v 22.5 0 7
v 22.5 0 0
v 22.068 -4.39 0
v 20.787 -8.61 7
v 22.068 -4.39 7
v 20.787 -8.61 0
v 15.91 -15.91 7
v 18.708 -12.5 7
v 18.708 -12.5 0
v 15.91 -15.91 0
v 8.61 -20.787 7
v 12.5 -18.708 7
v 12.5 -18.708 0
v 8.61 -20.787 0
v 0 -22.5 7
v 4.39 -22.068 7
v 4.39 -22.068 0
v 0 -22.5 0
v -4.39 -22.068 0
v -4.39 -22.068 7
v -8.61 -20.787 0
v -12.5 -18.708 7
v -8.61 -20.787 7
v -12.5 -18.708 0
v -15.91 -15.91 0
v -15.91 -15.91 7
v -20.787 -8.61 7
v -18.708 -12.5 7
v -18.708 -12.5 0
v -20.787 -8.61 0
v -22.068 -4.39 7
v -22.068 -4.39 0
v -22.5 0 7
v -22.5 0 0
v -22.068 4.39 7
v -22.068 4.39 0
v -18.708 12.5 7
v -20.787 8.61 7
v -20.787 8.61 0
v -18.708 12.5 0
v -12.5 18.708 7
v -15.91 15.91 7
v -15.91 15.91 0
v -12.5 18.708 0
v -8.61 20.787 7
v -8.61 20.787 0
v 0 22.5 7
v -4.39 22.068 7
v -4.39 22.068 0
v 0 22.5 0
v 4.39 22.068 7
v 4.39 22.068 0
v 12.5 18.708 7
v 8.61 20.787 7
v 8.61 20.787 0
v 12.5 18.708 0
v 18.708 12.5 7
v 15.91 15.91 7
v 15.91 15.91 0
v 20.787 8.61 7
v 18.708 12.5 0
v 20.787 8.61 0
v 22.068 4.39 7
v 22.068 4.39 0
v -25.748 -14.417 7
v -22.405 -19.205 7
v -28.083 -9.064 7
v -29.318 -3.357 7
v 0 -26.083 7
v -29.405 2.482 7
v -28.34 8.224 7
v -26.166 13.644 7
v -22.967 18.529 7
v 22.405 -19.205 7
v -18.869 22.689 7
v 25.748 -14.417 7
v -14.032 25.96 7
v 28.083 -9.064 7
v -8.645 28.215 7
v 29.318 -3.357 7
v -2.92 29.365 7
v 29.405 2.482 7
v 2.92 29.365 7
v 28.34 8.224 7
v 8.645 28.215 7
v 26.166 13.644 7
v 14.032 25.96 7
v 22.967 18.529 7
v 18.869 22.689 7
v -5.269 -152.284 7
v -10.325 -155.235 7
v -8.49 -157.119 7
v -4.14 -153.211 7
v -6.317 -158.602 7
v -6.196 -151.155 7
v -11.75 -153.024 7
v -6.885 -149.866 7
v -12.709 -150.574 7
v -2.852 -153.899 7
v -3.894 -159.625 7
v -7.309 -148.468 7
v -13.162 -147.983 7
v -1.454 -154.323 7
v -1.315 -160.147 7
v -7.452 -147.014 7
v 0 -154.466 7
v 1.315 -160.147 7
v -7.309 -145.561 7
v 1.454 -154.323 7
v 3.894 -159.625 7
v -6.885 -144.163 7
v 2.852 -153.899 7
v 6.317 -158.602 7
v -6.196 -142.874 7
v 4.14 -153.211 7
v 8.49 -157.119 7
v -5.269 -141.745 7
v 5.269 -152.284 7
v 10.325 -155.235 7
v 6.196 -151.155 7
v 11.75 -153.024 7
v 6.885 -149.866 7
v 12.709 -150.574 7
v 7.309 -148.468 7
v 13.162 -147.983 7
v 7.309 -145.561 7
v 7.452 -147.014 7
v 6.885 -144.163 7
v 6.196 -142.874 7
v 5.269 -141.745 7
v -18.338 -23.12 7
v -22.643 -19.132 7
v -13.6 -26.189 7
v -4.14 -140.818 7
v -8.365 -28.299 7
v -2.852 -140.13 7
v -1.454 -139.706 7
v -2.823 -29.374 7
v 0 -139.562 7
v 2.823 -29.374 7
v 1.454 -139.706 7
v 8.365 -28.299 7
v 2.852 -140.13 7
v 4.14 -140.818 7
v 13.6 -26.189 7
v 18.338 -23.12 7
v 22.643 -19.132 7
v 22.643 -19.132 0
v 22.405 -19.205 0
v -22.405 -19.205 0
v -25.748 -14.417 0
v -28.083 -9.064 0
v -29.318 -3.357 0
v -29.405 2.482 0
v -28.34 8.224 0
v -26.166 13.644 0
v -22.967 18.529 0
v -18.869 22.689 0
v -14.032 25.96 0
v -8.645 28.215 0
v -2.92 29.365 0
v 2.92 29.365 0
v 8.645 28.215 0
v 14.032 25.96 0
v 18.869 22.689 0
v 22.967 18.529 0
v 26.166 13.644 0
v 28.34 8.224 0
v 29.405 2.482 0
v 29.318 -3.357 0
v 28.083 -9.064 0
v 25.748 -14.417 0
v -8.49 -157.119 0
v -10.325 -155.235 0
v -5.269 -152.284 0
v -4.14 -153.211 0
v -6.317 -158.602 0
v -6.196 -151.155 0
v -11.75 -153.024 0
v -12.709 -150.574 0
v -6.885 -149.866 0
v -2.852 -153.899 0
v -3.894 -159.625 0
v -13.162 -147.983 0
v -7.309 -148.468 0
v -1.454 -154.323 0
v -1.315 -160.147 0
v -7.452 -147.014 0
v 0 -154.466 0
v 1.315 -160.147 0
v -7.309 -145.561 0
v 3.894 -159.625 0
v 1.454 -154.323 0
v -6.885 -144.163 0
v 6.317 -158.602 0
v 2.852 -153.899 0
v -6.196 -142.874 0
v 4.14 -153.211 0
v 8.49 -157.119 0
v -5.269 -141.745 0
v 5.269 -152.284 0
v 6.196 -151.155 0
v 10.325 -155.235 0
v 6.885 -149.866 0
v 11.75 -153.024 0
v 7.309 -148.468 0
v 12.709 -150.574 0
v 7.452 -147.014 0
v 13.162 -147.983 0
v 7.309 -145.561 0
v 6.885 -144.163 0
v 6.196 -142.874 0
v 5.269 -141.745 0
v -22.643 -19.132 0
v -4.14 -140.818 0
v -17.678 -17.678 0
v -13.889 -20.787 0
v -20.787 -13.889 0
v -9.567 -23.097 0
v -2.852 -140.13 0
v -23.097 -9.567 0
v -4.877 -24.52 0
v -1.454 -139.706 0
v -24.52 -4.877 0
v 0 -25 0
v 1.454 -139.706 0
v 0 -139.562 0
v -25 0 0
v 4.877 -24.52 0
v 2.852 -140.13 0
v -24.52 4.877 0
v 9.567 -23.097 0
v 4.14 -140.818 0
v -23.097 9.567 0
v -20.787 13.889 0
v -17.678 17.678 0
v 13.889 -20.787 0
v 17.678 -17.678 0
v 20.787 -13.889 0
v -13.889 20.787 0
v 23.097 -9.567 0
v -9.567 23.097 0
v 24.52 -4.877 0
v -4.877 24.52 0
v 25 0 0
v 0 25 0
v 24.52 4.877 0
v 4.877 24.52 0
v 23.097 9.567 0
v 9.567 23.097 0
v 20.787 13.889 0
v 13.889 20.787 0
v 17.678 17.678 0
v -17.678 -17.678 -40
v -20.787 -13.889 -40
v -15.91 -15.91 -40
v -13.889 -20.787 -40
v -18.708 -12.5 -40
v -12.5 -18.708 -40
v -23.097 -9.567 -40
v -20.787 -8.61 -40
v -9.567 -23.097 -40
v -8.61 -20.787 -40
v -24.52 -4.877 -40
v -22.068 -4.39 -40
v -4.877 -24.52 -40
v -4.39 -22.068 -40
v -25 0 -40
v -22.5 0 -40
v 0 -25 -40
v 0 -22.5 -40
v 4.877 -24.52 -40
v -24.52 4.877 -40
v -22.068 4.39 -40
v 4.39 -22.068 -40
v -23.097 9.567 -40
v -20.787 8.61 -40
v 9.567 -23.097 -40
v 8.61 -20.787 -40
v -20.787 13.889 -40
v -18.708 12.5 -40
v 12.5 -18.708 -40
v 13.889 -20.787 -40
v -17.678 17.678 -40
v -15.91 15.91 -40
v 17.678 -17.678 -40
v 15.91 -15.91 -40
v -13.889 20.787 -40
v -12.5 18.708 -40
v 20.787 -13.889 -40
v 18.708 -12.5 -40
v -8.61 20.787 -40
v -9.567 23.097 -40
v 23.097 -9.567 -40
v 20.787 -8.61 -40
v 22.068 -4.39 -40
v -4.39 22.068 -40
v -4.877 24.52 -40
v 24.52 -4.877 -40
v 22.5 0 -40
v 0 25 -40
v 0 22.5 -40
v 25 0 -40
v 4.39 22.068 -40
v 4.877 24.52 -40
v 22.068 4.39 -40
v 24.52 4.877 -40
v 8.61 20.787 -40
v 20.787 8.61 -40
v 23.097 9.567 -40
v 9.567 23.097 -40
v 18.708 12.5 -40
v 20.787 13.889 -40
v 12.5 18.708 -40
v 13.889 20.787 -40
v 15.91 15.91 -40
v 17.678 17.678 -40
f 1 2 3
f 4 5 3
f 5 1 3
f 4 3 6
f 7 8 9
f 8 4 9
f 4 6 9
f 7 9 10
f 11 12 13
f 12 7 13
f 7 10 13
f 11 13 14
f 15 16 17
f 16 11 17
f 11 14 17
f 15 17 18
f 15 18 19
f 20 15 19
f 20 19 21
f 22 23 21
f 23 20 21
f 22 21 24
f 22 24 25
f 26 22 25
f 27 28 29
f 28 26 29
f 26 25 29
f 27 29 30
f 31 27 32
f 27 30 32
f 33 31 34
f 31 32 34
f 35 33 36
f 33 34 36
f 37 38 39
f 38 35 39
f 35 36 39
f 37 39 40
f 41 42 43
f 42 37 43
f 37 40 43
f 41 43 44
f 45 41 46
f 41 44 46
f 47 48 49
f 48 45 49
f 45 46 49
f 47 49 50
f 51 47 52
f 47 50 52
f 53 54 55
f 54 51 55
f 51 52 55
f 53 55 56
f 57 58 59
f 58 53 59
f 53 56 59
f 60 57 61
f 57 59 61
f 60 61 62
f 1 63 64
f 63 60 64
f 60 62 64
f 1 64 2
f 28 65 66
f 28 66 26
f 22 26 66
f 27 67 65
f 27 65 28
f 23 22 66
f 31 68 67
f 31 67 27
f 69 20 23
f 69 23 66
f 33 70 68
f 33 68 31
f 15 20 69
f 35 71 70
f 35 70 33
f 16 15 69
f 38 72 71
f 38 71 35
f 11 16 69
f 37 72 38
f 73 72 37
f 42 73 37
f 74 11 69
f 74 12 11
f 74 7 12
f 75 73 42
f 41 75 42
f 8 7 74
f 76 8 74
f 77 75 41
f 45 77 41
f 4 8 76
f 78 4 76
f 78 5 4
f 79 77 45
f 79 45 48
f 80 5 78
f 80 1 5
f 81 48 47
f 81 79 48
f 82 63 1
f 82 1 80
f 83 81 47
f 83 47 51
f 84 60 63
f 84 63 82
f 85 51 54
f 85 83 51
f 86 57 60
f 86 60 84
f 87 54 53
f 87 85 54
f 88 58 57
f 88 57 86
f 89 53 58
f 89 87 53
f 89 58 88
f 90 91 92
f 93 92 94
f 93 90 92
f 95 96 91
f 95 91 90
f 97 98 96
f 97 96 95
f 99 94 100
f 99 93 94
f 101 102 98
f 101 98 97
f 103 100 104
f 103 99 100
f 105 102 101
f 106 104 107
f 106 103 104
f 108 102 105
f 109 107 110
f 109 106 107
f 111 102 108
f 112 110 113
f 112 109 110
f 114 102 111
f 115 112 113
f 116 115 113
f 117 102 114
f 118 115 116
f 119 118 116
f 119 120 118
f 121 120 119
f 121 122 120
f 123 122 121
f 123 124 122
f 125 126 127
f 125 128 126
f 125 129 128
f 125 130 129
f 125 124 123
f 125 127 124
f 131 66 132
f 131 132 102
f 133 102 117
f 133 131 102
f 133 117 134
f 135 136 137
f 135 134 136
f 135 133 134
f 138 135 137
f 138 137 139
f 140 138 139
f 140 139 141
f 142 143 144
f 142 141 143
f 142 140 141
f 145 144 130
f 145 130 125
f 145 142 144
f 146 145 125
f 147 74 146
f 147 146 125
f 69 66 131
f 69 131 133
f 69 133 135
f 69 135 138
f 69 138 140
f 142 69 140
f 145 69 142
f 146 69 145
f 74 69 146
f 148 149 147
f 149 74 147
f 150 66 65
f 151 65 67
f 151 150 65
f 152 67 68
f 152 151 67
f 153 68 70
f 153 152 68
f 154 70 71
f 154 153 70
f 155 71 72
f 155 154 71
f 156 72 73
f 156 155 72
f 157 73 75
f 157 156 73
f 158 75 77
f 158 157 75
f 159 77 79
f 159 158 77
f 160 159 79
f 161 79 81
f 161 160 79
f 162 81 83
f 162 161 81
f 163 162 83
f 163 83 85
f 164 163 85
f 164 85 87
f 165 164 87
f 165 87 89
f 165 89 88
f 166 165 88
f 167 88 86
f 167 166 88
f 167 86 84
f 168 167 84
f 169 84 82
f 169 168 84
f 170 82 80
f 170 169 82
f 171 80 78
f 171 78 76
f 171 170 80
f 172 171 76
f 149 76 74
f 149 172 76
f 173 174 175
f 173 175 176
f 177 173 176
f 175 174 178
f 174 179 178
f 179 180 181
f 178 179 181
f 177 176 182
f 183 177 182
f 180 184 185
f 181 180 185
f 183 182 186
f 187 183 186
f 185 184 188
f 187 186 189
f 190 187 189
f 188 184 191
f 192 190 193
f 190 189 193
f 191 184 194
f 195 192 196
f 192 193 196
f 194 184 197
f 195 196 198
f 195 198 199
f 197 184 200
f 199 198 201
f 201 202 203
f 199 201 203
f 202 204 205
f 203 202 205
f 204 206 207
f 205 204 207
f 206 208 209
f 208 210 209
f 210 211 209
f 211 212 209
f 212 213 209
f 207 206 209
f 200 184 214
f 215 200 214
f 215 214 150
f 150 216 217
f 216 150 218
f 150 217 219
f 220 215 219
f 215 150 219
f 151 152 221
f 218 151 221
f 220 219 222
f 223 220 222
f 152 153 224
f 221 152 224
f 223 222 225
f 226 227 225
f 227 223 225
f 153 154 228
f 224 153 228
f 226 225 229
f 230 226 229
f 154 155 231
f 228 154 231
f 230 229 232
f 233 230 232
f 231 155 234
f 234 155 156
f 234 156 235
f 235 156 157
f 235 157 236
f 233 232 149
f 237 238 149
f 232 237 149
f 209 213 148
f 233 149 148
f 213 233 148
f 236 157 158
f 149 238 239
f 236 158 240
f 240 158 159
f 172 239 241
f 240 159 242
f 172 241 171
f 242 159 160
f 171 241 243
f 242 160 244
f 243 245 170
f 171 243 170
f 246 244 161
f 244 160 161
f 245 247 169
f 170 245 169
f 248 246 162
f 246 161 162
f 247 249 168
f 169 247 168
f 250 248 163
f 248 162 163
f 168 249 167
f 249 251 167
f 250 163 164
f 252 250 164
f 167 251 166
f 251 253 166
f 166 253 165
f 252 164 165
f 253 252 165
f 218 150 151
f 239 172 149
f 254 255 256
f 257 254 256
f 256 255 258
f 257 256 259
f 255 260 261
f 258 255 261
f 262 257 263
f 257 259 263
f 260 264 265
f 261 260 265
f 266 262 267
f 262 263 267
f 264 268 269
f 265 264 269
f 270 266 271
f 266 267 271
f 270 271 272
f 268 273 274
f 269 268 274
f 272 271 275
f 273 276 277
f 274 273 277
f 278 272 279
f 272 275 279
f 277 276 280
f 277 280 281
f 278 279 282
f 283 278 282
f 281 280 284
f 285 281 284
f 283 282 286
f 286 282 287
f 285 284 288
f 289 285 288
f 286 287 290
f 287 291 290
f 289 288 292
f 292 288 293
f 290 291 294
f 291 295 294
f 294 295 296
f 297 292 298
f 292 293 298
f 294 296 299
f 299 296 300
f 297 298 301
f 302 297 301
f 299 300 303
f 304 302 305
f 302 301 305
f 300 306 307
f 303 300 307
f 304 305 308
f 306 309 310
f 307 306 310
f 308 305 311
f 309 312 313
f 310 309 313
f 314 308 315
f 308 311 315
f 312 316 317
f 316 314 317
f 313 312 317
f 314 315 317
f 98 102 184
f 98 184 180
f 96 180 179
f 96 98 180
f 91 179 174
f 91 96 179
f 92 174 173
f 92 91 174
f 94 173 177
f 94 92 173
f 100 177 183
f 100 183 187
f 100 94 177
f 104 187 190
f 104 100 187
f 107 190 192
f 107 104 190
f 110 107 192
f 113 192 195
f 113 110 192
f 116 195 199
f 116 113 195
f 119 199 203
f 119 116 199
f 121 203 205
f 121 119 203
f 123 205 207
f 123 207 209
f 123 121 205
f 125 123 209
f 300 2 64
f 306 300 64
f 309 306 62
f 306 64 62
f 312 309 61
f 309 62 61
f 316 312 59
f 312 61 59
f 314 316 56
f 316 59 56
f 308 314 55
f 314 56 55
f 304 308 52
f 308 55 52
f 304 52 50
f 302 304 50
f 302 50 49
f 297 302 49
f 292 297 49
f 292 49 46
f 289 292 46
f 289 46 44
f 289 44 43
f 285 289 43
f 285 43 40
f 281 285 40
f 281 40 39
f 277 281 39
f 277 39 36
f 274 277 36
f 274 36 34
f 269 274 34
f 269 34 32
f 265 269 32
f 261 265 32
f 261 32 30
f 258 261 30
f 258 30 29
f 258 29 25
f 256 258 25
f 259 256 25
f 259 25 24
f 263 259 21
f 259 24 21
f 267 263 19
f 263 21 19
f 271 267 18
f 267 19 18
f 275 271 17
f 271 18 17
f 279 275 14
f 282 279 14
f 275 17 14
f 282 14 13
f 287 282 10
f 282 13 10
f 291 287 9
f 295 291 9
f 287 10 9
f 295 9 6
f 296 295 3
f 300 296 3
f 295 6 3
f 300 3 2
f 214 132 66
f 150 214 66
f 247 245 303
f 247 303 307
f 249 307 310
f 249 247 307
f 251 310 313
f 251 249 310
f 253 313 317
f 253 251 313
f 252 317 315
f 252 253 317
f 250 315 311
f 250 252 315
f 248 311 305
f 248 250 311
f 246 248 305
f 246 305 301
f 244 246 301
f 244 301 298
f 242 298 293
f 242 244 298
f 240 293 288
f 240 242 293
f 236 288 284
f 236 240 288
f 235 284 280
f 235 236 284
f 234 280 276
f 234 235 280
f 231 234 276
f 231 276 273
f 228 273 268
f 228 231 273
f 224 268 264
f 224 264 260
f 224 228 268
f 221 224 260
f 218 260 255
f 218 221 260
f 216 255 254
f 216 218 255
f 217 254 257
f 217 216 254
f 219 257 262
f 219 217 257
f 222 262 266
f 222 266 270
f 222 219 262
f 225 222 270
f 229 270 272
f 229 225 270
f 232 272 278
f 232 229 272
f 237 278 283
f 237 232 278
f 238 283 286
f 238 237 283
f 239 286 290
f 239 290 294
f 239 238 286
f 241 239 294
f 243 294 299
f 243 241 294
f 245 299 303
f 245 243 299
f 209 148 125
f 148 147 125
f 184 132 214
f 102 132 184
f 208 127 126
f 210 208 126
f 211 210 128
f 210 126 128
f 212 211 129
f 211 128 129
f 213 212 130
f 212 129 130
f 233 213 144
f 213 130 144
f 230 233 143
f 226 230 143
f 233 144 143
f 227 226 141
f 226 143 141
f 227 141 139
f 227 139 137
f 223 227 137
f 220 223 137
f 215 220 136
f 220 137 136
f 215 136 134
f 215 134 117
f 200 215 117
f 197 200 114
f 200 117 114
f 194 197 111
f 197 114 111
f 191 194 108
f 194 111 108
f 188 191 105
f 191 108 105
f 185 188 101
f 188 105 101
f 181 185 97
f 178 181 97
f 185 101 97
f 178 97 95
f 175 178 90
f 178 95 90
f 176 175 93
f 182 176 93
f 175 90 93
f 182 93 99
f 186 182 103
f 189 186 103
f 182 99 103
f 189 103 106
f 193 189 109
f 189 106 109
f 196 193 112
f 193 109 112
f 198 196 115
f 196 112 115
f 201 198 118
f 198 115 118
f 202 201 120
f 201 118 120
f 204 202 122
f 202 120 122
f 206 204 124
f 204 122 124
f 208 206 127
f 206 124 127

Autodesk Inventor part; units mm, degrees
ref_plane "YZ Plane" through (0, 0, 0) normal (1, 0, 0) x (0, 1, 0)
ref_plane "XZ Plane" through (0, 0, 0) normal (0, 1, 0) x (-1, 0, 0)
ref_plane "XY Plane" through (0, 0, 0) normal (0, 0, 1) x (1, 0, 0)
sketch "Sketch1" plane through (0, 0, 0) normal (0, 0, 1) x (1, 0, 0)
  circle A0 centre (0, 0) radius 22.5
  circle A1 centre (0, 0) radius 25
  dimension "d2" = 45
  dimension "d3" = 50
extrude "Extrusion1" add sketch "Sketch1" against normal blind 40
sketch "Sketch2" plane through (0, 0, 0) normal (0, 0, 1) x (1, 0, 0)
  circle A0 centre (0, 0) radius 22.5
  circle A1 centre (0, 0) radius 29.5096
extrude "Extrusion2" add sketch "Sketch2" along normal blind 7
sketch "Sketch3" plane through (0, 0, 7) normal (0, 0, 1) x (1, 0, 0)
  line L0 (22.6433, -19.1315) -> (13.1623, -147.983)
  arc A0 (-13.1623, -147.983) -> (13.1623, -147.983) centre (0, -147.0145) ccw
  circle A1 centre (0, 0) radius 29.5096 projected
  line L1 (0, -29.5096) -> (0, -45.4675)
  line L2 (-22.6433, -19.1315) -> (-13.1623, -147.983)
  line L3 (-22.6433, -19.1315) -> (0, -26.0827)
  line L4 (0, -26.0827) -> (22.6433, -19.1315)
  circle A2 centre (0, -147.0145) radius 7.452
extrude "Extrusion3" add sketch "Sketch3" against normal blind 7 contours L0 A0 L2 L3 A1 L4 | A1 L3 L4 picked at (-13.395, -22.9465)
properties part number "Manivelle"
